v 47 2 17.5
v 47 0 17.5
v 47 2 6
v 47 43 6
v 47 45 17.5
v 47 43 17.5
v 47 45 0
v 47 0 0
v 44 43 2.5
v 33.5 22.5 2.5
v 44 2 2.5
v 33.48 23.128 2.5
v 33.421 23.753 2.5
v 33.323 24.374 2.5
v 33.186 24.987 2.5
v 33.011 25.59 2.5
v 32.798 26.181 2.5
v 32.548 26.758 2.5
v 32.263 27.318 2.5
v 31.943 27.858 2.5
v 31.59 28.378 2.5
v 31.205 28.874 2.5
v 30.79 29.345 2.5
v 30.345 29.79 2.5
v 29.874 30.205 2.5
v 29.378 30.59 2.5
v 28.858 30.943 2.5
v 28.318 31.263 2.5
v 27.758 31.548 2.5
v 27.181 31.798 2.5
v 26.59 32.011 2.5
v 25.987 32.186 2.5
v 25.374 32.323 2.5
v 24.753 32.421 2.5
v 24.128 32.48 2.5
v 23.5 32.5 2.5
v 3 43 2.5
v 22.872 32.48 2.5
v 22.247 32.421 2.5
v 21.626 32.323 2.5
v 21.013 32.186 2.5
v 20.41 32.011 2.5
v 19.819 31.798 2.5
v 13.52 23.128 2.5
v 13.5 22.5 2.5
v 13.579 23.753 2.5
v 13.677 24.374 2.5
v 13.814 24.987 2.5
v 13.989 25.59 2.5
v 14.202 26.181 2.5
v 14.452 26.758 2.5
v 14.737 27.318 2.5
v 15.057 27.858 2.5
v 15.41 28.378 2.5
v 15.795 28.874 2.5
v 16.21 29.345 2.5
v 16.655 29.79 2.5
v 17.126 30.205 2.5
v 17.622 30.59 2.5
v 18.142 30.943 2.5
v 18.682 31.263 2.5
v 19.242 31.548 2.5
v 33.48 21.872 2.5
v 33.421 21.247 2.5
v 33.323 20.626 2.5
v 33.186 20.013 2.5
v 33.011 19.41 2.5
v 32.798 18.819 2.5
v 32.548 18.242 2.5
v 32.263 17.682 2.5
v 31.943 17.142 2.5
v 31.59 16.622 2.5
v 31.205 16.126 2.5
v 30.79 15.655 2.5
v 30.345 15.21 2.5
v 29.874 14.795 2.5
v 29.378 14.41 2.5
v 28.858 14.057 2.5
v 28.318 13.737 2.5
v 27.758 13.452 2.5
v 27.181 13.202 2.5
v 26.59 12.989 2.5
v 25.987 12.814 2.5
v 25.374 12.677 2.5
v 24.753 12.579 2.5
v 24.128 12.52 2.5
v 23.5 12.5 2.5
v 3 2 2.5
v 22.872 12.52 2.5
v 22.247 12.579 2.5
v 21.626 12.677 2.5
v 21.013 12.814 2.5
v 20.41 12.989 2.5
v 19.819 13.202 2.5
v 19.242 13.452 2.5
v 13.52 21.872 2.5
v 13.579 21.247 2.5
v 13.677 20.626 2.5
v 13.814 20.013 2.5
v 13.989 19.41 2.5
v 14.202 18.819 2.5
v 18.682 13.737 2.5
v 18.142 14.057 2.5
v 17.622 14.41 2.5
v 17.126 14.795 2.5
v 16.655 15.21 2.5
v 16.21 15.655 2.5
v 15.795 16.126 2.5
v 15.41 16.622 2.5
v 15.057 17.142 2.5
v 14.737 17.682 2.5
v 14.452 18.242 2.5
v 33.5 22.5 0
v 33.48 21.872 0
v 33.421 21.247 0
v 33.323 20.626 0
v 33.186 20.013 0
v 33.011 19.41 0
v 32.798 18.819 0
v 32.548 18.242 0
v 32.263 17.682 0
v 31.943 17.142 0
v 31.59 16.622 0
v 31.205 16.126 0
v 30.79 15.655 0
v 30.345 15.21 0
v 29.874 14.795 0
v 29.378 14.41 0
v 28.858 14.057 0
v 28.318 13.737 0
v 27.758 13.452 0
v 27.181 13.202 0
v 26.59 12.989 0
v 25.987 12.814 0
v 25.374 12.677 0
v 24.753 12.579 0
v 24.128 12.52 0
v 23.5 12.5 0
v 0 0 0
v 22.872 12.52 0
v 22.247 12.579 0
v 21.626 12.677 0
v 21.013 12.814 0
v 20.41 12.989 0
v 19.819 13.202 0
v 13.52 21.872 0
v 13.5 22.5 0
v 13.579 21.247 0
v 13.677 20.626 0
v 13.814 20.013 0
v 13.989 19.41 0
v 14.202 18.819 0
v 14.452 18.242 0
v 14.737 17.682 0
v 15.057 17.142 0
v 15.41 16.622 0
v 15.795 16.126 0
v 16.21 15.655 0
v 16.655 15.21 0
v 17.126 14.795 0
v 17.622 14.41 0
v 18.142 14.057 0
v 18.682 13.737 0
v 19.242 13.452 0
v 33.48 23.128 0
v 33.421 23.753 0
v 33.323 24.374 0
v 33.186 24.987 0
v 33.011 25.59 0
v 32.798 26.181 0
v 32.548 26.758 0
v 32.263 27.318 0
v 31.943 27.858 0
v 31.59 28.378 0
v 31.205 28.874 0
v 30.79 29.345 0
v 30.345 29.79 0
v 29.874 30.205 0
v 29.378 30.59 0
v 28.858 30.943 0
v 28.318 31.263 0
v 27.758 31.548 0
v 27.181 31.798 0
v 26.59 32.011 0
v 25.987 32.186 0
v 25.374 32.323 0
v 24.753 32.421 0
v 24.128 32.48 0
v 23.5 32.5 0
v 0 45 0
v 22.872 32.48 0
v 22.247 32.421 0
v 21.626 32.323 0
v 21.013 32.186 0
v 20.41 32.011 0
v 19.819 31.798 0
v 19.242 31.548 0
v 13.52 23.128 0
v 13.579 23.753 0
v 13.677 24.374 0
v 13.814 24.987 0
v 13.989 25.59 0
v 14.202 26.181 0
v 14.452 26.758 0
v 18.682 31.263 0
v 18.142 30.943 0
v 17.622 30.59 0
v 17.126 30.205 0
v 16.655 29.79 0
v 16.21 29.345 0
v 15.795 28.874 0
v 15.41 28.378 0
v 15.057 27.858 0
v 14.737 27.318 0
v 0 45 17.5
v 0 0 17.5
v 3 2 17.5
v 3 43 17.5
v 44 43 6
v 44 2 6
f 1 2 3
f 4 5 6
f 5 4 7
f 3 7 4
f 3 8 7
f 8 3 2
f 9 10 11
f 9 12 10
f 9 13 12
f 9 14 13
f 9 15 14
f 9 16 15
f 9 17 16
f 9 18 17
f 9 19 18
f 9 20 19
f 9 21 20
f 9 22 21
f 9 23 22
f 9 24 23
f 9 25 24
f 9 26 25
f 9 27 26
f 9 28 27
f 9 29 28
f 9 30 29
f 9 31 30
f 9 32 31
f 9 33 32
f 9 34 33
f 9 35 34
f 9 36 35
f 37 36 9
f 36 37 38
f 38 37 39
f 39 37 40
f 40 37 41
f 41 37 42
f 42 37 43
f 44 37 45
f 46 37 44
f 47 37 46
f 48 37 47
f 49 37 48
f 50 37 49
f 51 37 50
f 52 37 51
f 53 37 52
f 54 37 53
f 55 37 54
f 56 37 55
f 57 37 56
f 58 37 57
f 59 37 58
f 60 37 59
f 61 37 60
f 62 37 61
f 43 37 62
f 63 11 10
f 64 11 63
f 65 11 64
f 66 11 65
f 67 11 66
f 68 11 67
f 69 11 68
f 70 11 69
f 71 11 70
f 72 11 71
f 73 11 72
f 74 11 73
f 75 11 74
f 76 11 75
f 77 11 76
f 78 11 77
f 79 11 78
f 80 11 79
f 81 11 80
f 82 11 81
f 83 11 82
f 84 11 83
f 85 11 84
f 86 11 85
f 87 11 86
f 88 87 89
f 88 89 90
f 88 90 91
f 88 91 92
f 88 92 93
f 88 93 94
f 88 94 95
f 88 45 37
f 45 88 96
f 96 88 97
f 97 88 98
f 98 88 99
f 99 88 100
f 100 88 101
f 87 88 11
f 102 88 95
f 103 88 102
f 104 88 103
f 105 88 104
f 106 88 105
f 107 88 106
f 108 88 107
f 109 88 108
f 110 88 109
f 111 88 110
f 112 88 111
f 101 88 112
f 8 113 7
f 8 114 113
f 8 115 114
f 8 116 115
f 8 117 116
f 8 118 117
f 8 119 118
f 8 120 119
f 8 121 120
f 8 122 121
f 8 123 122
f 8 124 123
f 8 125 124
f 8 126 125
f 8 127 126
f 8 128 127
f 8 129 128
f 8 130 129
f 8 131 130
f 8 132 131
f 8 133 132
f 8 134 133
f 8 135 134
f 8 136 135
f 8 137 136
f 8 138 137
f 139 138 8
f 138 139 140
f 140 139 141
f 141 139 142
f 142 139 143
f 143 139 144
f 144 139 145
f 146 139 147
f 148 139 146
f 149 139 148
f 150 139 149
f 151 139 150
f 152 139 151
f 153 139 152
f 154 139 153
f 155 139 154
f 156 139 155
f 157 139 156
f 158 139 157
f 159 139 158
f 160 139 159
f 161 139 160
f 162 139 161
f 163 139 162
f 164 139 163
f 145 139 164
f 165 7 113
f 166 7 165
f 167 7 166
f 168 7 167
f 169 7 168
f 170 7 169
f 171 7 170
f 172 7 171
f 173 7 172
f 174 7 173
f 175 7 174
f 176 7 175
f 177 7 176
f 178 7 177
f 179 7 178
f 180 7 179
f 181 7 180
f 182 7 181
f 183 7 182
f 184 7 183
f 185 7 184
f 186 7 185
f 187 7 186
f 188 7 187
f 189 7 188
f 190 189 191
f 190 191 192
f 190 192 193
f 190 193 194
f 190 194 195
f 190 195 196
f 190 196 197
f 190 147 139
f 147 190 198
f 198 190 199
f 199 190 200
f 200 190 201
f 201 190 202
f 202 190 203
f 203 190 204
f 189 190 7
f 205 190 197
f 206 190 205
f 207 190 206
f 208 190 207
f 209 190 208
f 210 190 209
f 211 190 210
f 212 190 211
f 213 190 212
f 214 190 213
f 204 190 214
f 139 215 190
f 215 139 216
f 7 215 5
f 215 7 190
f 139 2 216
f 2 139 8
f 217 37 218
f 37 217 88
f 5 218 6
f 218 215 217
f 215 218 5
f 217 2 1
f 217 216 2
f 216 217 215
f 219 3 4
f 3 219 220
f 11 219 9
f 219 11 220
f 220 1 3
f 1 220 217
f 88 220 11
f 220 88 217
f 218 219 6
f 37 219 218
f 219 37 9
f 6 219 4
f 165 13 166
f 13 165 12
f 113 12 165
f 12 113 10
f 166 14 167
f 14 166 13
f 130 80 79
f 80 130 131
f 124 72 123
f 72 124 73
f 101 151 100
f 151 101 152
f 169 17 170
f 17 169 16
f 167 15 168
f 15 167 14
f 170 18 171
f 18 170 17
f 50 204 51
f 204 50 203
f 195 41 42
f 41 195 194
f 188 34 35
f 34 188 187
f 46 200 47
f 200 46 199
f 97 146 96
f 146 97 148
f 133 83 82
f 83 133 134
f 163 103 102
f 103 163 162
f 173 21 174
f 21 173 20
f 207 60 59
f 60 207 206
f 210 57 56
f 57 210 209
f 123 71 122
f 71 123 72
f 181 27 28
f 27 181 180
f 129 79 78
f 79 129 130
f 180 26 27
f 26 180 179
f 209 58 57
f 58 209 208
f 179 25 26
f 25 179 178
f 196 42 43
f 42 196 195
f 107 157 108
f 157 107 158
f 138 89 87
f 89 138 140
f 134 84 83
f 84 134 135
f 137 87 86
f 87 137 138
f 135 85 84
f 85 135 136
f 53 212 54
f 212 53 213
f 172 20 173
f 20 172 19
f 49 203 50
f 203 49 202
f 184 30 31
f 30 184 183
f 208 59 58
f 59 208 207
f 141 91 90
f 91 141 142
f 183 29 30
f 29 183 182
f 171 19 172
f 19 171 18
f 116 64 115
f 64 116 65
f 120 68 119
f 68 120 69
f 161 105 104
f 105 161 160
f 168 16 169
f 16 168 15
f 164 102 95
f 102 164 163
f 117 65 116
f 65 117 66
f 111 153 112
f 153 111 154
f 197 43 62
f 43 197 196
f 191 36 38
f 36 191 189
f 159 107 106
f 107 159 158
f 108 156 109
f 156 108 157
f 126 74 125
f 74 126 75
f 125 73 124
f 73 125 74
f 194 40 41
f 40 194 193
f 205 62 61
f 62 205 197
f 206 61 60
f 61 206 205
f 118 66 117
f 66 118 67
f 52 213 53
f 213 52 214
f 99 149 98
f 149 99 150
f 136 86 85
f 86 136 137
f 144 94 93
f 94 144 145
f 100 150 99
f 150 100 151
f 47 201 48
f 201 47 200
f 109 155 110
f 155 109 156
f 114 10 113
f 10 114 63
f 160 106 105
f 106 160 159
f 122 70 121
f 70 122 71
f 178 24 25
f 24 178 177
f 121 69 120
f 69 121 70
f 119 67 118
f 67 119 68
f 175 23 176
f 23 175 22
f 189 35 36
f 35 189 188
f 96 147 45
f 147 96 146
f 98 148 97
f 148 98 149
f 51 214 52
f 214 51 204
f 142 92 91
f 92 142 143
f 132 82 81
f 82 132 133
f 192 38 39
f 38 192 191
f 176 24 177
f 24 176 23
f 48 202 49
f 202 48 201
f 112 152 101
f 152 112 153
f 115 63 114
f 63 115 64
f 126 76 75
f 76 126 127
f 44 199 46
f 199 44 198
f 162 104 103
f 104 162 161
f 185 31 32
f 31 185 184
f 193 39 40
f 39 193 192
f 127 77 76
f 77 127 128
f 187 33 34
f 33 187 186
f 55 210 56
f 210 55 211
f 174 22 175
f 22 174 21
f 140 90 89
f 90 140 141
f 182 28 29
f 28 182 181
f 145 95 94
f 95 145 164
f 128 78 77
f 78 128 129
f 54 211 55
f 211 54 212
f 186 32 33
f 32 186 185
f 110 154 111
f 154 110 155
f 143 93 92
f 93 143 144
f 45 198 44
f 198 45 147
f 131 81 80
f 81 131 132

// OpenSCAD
// Mini Zigbee Module Enclosure - Bottom
// Enclosure for 41x41mm zigbee module

// Parameters (all in mm)
module_size = 41;                   // Internal size for zigbee module
vertical_wall_thickness = 3;        // Thickness of top/bottom walls
horizontal_wall_thickness = 2;      // Thickness of left/right walls
bottom_thickness = 2.5;             // Thickness of bottom plate
top_wall_height = 15;               // Height of top wall above bottom
right_wall_height = 15;             // Height of right wall above bottom
bottom_wall_height = 3.5;           // Height of bottom wall above bottom
left_wall_height = 15;              // Height of left wall above bottom
hole_diameter = 20;                 // Center hole diameter

// Calculated values
outer_width = module_size + (2 * vertical_wall_thickness);      // Width (top to bottom direction)
outer_depth = module_size + (2 * horizontal_wall_thickness);    // Depth (left to right direction)
max_wall_height = max(top_wall_height, max(right_wall_height, max(bottom_wall_height, left_wall_height)));
total_height = bottom_thickness + max_wall_height;    // Total height based on tallest wall

// Main module
module zigbee_bottom() {
    $fn = 100;  // Smooth circles/arcs

    difference() {
        union() {
            // Bottom plate
            cube([outer_width, outer_depth, bottom_thickness]);

            // Top wall (front)
            cube([vertical_wall_thickness, outer_depth, bottom_thickness + top_wall_height]);

            // Bottom wall (back)
            translate([outer_width - vertical_wall_thickness, 0, 0])
                cube([vertical_wall_thickness, outer_depth, bottom_thickness + bottom_wall_height]);

            // Left wall
            cube([outer_width, horizontal_wall_thickness, bottom_thickness + left_wall_height]);

            // Right wall
            translate([0, outer_depth - horizontal_wall_thickness, 0])
                cube([outer_width, horizontal_wall_thickness, bottom_thickness + right_wall_height]);
        }

        // Center hole through bottom
        translate([outer_width/2, outer_depth/2, -0.1])
            cylinder(h = bottom_thickness + 0.2, d = hole_diameter);
    }
}

// Render
zigbee_bottom();
